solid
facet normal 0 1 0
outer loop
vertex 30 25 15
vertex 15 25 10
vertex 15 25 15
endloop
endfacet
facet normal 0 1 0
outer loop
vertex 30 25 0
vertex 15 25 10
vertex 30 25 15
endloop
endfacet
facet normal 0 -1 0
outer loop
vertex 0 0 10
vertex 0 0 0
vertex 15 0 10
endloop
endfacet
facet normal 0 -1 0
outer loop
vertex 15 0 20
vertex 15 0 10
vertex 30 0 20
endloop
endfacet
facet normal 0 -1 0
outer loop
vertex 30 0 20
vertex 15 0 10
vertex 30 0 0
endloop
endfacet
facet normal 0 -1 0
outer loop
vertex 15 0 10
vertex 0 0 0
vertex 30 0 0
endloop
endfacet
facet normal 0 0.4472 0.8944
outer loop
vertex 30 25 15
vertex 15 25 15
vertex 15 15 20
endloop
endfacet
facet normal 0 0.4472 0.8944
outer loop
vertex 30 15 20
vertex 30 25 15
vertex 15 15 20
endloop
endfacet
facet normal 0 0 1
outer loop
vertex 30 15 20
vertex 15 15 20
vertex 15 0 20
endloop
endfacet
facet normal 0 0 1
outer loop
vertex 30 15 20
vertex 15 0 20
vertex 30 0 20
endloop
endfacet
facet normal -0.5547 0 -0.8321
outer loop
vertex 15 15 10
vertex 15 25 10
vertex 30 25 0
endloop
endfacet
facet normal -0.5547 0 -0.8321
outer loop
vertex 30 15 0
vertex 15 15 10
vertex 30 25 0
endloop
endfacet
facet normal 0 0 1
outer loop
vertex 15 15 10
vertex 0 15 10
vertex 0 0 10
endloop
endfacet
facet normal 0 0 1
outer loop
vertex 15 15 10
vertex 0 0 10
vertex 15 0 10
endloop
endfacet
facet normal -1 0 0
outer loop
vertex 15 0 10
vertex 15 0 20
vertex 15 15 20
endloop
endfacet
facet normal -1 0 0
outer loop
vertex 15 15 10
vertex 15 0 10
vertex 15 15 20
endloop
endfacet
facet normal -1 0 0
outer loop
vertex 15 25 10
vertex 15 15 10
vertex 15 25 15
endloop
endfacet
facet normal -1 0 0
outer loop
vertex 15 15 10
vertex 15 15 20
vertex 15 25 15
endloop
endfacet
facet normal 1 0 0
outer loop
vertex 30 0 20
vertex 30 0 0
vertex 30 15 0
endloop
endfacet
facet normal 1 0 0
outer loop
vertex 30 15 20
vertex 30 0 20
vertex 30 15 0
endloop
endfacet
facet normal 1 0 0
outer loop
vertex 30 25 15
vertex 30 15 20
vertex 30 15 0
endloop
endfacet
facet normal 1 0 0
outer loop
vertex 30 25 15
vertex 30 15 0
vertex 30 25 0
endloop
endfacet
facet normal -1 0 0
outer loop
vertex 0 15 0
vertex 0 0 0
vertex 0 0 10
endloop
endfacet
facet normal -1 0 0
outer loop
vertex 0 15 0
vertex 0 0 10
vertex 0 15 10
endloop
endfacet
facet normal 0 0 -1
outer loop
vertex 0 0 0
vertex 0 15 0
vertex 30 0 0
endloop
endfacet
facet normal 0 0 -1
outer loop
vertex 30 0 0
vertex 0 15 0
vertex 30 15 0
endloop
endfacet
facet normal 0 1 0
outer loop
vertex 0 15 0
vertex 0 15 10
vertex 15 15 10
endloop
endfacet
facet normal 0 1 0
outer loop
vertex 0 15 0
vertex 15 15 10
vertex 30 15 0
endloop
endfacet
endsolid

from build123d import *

# Parameters (mm, degrees)
SKETCH1_W           = 30
SKETCH1_H           = 25
BOSS_EXTRUDE1_DEPTH = 20
SKETCH2_W           = 15
SKETCH2_H           = 25
CUT_EXTRUDE1_DEPTH  = 10
SKETCH3_W           = 15
SKETCH3_H           = 10
CUT_EXTRUDE2_DEPTH  = 10
CUT_EXTRUDE3_DEPTH  = 20
CUT_EXTRUDE4_DEPTH  = 10


with BuildPart() as part:
    # Sketch1 → Boss-Extrude1 (new body)
    with BuildSketch(Plane.XY):
        with Locations((15, 12.5)):
            Rectangle(SKETCH1_W, SKETCH1_H)
    extrude(amount=BOSS_EXTRUDE1_DEPTH)

    # Sketch2 → Cut-Extrude1 (cut)
    with BuildSketch(Plane.XY.offset(20)):
        with Locations((7.5, 12.5)):
            Rectangle(SKETCH2_W, SKETCH2_H)
    extrude(amount=-CUT_EXTRUDE1_DEPTH, mode=Mode.SUBTRACT)

    # Sketch3 → Cut-Extrude2 (cut)
    with BuildSketch(Plane.XY.offset(10)):
        with Locations((7.5, 20)):
            Rectangle(SKETCH3_W, SKETCH3_H)
    extrude(amount=-CUT_EXTRUDE2_DEPTH, mode=Mode.SUBTRACT)

    # Sketch4 → Cut-Extrude3 (cut)
    with BuildSketch(Plane.ZY.offset(-15)):
        Polygon((15, 25), (20, 15), (20, 25), align=None)
    extrude(amount=-CUT_EXTRUDE3_DEPTH, mode=Mode.SUBTRACT)

    # Sketch5 → Cut-Extrude4 (cut)
    with BuildSketch(Plane(origin=(0, 25, 0), x_dir=(1, 0, 0), z_dir=(0, 1, 0))):
        Polygon((15, -10), (30, 0), (15, 0), align=None)
    extrude(amount=-CUT_EXTRUDE4_DEPTH, mode=Mode.SUBTRACT)


solid = part.part
